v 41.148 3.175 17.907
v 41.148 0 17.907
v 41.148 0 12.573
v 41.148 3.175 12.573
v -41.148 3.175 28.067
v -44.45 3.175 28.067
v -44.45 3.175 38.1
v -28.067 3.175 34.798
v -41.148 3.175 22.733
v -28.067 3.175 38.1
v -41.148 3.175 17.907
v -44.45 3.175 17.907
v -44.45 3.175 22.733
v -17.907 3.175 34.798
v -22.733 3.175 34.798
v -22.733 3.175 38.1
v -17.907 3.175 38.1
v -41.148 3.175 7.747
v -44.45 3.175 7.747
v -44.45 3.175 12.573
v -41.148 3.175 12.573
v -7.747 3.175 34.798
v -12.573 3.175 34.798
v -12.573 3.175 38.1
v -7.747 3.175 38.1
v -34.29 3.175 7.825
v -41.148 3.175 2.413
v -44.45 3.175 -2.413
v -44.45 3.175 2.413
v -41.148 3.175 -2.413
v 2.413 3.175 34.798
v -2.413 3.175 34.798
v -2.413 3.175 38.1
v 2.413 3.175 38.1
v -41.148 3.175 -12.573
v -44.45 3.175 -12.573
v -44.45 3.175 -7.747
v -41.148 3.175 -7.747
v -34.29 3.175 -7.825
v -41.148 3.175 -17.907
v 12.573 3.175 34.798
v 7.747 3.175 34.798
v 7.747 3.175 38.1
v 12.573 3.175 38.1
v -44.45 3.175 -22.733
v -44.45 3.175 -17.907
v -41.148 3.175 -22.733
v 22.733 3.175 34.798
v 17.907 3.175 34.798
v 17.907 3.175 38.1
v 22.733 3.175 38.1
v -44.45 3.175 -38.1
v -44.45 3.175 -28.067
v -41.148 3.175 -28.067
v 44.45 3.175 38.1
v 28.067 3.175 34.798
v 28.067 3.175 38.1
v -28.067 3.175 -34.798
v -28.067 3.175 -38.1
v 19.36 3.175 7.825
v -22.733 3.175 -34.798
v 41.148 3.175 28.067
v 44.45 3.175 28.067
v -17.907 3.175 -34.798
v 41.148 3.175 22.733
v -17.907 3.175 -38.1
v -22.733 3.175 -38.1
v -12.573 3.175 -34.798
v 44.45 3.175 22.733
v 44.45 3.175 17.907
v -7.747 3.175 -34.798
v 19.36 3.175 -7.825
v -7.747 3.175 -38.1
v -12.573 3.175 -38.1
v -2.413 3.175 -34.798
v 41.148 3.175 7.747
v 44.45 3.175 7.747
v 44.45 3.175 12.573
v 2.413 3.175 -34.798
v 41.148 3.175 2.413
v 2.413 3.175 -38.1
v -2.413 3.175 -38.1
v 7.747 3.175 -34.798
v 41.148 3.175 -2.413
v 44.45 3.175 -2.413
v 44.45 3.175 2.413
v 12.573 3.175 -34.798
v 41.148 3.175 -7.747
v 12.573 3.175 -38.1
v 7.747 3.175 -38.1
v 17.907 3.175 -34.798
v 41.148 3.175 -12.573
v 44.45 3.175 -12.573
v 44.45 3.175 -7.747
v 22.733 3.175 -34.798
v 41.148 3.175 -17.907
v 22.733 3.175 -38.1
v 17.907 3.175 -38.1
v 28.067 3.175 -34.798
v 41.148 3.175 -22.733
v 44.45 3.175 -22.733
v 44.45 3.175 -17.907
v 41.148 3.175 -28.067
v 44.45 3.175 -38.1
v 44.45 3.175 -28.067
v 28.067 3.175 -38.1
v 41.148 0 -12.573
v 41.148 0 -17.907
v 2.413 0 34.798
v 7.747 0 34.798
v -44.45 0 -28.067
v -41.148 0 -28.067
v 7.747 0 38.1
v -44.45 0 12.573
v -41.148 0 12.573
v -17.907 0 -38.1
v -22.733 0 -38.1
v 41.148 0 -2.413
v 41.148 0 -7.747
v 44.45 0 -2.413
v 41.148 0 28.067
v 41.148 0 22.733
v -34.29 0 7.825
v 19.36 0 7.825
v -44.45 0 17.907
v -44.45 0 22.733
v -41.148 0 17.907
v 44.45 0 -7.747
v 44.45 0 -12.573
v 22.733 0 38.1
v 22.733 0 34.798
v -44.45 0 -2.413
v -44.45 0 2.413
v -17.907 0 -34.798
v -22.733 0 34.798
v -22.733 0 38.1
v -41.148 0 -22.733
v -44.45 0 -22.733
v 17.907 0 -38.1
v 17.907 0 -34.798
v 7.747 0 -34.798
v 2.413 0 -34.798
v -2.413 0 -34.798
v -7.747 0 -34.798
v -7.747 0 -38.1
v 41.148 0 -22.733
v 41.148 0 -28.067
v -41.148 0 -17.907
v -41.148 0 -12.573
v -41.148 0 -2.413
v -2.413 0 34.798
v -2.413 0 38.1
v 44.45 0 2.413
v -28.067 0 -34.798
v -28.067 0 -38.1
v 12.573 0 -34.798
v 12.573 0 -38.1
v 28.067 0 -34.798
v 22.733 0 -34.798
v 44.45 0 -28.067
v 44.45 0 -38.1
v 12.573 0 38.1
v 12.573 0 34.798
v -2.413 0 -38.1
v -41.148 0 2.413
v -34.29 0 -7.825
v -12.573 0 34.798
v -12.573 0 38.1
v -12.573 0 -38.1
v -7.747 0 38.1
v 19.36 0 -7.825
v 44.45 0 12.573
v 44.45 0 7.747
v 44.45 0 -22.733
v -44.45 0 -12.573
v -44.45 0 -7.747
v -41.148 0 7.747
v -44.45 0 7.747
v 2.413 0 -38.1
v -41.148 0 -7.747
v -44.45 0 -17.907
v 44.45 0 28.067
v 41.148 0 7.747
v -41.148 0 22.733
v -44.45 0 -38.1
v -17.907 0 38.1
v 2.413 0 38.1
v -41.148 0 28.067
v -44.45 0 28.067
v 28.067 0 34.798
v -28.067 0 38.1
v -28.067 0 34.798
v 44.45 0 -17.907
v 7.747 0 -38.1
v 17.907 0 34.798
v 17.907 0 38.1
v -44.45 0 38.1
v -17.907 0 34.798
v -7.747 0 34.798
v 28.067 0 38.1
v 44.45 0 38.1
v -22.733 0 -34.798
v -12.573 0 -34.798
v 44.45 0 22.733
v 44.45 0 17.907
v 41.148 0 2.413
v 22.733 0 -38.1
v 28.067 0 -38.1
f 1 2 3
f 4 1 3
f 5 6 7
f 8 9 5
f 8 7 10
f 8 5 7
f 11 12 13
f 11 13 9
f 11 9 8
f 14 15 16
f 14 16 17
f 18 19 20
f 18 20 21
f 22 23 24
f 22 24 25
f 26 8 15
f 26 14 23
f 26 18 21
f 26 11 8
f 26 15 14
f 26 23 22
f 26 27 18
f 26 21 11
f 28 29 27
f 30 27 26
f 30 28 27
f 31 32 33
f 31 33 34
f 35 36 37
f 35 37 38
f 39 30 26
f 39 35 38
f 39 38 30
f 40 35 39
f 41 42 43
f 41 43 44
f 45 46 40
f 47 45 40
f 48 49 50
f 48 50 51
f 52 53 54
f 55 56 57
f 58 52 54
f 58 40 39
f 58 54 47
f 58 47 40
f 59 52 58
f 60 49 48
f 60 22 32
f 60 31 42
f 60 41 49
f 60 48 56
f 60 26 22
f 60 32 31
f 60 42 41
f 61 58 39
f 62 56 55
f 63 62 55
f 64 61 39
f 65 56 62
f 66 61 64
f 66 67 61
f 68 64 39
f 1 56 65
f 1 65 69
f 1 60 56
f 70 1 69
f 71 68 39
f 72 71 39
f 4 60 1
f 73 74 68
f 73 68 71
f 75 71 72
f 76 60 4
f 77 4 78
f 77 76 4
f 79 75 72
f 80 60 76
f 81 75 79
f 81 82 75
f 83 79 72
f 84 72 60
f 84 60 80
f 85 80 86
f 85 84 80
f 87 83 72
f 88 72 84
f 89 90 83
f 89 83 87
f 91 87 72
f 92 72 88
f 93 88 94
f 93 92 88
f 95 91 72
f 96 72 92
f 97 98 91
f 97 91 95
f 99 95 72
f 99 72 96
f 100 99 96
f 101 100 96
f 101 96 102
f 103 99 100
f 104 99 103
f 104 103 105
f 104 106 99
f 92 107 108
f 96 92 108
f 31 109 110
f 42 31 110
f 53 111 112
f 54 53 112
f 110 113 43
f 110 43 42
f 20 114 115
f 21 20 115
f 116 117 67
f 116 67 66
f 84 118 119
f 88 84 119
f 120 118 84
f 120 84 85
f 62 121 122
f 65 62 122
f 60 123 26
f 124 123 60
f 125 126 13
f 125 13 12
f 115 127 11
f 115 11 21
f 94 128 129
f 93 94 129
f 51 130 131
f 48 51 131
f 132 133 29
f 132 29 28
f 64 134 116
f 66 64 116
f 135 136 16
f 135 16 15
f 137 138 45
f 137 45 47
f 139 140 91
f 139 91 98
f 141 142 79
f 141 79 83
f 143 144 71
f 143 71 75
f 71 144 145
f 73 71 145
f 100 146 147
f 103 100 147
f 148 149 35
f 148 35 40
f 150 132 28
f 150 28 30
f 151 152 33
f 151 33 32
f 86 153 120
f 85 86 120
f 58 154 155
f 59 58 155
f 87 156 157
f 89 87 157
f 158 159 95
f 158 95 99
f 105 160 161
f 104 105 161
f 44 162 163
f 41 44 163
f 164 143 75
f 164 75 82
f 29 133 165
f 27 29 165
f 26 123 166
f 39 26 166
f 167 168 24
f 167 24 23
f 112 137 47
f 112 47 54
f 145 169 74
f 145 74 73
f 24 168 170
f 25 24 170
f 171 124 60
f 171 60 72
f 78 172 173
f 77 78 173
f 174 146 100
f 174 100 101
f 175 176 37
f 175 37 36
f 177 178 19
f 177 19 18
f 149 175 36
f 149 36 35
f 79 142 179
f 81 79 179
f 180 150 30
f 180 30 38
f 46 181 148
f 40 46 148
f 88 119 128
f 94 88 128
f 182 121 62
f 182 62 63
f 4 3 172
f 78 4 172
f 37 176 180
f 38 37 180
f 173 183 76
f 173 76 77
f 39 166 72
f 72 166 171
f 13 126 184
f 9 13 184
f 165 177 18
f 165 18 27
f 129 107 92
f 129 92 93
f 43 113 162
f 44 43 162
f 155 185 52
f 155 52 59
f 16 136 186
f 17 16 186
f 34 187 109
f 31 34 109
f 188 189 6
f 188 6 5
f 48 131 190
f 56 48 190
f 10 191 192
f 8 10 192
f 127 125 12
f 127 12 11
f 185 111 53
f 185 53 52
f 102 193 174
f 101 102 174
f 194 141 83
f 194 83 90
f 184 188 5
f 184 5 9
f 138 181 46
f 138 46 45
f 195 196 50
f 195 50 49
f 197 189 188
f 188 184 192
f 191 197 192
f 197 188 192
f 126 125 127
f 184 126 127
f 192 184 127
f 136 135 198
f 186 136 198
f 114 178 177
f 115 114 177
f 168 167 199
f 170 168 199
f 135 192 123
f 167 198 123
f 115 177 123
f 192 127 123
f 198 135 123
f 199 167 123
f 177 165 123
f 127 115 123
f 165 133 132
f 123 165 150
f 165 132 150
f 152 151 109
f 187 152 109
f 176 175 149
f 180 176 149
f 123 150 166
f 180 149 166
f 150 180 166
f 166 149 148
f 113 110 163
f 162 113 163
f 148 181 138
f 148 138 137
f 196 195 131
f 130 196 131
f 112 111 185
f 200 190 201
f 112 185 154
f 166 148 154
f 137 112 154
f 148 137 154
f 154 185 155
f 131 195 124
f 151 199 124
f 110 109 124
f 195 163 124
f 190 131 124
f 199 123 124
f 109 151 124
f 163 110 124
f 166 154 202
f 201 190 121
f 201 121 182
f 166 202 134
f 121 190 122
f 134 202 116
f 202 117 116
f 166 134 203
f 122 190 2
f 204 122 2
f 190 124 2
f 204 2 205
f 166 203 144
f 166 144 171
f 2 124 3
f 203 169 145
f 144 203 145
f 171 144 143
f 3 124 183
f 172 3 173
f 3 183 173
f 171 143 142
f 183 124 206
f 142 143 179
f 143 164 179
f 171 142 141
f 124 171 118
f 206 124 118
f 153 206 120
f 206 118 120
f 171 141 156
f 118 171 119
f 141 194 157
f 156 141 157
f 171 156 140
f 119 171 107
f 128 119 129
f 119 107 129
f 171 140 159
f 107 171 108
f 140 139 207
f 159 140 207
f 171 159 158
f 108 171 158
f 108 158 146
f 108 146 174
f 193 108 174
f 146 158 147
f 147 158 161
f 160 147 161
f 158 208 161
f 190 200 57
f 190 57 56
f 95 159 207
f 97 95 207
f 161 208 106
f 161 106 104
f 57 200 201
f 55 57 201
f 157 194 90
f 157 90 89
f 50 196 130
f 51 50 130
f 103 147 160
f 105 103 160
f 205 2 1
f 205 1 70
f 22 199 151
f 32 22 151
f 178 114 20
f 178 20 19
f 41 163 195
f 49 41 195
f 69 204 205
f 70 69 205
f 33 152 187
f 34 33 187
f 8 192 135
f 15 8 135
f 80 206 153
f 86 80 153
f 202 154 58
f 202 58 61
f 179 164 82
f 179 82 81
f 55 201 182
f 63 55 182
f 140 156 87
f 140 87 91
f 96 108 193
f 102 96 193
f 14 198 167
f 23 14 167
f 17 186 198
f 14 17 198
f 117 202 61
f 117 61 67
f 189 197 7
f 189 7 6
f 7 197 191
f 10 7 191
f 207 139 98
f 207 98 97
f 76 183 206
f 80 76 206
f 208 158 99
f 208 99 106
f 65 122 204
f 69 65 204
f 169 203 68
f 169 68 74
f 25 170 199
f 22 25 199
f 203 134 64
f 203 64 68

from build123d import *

# Parameters (mm, degrees)
SKETCH1_W           = 88.9
SKETCH1_H           = 76.2
SKETCH1_W_2         = 53.65
SKETCH1_H_2         = 15.65
BOSS_EXTRUDE1_DEPTH = 3.175
SKETCH2_W           = 5.334
SKETCH2_H           = 3.302
SKETCH2_W_2         = 3.302
SKETCH2_H_2         = 5.334
CUT_EXTRUDE1_DEPTH  = 59.630138368


with BuildPart() as part:
    # Sketch1 → Boss-Extrude1 (new body)
    with BuildSketch(Plane(origin=(0, 0, 0), x_dir=(1, 0, 0), z_dir=(0, 1, 0))):
        Rectangle(SKETCH1_W, SKETCH1_H)
        with Locations((-7.465, 0)):
            Rectangle(SKETCH1_W_2, SKETCH1_H_2, mode=Mode.SUBTRACT)
    extrude(amount=BOSS_EXTRUDE1_DEPTH)

    # Sketch2 → Cut-Extrude1 (cut, through all)
    with BuildSketch(Plane(origin=(0, 0, 0), x_dir=(1, 0, 0), z_dir=(0, 1, 0))):
        with Locations((-25.4, -36.449)):
            Rectangle(SKETCH2_W, SKETCH2_H)
        with Locations((-42.799, -15.24)):
            Rectangle(SKETCH2_W_2, SKETCH2_H_2)
        with Locations((-42.799, -25.4)):
            Rectangle(SKETCH2_W_2, SKETCH2_H_2)
        with Locations((-42.799, -5.08)):
            Rectangle(SKETCH2_W_2, SKETCH2_H_2)
        with Locations((-42.799, 5.08)):
            Rectangle(SKETCH2_W_2, SKETCH2_H_2)
        with Locations((-42.799, 15.24)):
            Rectangle(SKETCH2_W_2, SKETCH2_H_2)
        with Locations((-42.799, 25.4)):
            Rectangle(SKETCH2_W_2, SKETCH2_H_2)
        with Locations((42.799, 25.4)):
            Rectangle(SKETCH2_W_2, SKETCH2_H_2)
        with Locations((42.799, 15.24)):
            Rectangle(SKETCH2_W_2, SKETCH2_H_2)
        with Locations((42.799, 5.08)):
            Rectangle(SKETCH2_W_2, SKETCH2_H_2)
        with Locations((42.799, -5.08)):
            Rectangle(SKETCH2_W_2, SKETCH2_H_2)
        with Locations((42.799, -15.24)):
            Rectangle(SKETCH2_W_2, SKETCH2_H_2)
        with Locations((42.799, -25.4)):
            Rectangle(SKETCH2_W_2, SKETCH2_H_2)
        with Locations((-15.24, -36.449)):
            Rectangle(SKETCH2_W, SKETCH2_H)
        with Locations((-5.08, -36.449)):
            Rectangle(SKETCH2_W, SKETCH2_H)
        with Locations((5.08, -36.449)):
            Rectangle(SKETCH2_W, SKETCH2_H)
        with Locations((15.24, -36.449)):
            Rectangle(SKETCH2_W, SKETCH2_H)
        with Locations((25.4, -36.449)):
            Rectangle(SKETCH2_W, SKETCH2_H)
        with Locations((25.4, 36.449)):
            Rectangle(SKETCH2_W, SKETCH2_H)
        with Locations((15.24, 36.449)):
            Rectangle(SKETCH2_W, SKETCH2_H)
        with Locations((5.08, 36.449)):
            Rectangle(SKETCH2_W, SKETCH2_H)
        with Locations((-5.08, 36.449)):
            Rectangle(SKETCH2_W, SKETCH2_H)
        with Locations((-15.24, 36.449)):
            Rectangle(SKETCH2_W, SKETCH2_H)
        with Locations((-25.4, 36.449)):
            Rectangle(SKETCH2_W, SKETCH2_H)
    extrude(amount=CUT_EXTRUDE1_DEPTH, mode=Mode.SUBTRACT)


solid = part.part
